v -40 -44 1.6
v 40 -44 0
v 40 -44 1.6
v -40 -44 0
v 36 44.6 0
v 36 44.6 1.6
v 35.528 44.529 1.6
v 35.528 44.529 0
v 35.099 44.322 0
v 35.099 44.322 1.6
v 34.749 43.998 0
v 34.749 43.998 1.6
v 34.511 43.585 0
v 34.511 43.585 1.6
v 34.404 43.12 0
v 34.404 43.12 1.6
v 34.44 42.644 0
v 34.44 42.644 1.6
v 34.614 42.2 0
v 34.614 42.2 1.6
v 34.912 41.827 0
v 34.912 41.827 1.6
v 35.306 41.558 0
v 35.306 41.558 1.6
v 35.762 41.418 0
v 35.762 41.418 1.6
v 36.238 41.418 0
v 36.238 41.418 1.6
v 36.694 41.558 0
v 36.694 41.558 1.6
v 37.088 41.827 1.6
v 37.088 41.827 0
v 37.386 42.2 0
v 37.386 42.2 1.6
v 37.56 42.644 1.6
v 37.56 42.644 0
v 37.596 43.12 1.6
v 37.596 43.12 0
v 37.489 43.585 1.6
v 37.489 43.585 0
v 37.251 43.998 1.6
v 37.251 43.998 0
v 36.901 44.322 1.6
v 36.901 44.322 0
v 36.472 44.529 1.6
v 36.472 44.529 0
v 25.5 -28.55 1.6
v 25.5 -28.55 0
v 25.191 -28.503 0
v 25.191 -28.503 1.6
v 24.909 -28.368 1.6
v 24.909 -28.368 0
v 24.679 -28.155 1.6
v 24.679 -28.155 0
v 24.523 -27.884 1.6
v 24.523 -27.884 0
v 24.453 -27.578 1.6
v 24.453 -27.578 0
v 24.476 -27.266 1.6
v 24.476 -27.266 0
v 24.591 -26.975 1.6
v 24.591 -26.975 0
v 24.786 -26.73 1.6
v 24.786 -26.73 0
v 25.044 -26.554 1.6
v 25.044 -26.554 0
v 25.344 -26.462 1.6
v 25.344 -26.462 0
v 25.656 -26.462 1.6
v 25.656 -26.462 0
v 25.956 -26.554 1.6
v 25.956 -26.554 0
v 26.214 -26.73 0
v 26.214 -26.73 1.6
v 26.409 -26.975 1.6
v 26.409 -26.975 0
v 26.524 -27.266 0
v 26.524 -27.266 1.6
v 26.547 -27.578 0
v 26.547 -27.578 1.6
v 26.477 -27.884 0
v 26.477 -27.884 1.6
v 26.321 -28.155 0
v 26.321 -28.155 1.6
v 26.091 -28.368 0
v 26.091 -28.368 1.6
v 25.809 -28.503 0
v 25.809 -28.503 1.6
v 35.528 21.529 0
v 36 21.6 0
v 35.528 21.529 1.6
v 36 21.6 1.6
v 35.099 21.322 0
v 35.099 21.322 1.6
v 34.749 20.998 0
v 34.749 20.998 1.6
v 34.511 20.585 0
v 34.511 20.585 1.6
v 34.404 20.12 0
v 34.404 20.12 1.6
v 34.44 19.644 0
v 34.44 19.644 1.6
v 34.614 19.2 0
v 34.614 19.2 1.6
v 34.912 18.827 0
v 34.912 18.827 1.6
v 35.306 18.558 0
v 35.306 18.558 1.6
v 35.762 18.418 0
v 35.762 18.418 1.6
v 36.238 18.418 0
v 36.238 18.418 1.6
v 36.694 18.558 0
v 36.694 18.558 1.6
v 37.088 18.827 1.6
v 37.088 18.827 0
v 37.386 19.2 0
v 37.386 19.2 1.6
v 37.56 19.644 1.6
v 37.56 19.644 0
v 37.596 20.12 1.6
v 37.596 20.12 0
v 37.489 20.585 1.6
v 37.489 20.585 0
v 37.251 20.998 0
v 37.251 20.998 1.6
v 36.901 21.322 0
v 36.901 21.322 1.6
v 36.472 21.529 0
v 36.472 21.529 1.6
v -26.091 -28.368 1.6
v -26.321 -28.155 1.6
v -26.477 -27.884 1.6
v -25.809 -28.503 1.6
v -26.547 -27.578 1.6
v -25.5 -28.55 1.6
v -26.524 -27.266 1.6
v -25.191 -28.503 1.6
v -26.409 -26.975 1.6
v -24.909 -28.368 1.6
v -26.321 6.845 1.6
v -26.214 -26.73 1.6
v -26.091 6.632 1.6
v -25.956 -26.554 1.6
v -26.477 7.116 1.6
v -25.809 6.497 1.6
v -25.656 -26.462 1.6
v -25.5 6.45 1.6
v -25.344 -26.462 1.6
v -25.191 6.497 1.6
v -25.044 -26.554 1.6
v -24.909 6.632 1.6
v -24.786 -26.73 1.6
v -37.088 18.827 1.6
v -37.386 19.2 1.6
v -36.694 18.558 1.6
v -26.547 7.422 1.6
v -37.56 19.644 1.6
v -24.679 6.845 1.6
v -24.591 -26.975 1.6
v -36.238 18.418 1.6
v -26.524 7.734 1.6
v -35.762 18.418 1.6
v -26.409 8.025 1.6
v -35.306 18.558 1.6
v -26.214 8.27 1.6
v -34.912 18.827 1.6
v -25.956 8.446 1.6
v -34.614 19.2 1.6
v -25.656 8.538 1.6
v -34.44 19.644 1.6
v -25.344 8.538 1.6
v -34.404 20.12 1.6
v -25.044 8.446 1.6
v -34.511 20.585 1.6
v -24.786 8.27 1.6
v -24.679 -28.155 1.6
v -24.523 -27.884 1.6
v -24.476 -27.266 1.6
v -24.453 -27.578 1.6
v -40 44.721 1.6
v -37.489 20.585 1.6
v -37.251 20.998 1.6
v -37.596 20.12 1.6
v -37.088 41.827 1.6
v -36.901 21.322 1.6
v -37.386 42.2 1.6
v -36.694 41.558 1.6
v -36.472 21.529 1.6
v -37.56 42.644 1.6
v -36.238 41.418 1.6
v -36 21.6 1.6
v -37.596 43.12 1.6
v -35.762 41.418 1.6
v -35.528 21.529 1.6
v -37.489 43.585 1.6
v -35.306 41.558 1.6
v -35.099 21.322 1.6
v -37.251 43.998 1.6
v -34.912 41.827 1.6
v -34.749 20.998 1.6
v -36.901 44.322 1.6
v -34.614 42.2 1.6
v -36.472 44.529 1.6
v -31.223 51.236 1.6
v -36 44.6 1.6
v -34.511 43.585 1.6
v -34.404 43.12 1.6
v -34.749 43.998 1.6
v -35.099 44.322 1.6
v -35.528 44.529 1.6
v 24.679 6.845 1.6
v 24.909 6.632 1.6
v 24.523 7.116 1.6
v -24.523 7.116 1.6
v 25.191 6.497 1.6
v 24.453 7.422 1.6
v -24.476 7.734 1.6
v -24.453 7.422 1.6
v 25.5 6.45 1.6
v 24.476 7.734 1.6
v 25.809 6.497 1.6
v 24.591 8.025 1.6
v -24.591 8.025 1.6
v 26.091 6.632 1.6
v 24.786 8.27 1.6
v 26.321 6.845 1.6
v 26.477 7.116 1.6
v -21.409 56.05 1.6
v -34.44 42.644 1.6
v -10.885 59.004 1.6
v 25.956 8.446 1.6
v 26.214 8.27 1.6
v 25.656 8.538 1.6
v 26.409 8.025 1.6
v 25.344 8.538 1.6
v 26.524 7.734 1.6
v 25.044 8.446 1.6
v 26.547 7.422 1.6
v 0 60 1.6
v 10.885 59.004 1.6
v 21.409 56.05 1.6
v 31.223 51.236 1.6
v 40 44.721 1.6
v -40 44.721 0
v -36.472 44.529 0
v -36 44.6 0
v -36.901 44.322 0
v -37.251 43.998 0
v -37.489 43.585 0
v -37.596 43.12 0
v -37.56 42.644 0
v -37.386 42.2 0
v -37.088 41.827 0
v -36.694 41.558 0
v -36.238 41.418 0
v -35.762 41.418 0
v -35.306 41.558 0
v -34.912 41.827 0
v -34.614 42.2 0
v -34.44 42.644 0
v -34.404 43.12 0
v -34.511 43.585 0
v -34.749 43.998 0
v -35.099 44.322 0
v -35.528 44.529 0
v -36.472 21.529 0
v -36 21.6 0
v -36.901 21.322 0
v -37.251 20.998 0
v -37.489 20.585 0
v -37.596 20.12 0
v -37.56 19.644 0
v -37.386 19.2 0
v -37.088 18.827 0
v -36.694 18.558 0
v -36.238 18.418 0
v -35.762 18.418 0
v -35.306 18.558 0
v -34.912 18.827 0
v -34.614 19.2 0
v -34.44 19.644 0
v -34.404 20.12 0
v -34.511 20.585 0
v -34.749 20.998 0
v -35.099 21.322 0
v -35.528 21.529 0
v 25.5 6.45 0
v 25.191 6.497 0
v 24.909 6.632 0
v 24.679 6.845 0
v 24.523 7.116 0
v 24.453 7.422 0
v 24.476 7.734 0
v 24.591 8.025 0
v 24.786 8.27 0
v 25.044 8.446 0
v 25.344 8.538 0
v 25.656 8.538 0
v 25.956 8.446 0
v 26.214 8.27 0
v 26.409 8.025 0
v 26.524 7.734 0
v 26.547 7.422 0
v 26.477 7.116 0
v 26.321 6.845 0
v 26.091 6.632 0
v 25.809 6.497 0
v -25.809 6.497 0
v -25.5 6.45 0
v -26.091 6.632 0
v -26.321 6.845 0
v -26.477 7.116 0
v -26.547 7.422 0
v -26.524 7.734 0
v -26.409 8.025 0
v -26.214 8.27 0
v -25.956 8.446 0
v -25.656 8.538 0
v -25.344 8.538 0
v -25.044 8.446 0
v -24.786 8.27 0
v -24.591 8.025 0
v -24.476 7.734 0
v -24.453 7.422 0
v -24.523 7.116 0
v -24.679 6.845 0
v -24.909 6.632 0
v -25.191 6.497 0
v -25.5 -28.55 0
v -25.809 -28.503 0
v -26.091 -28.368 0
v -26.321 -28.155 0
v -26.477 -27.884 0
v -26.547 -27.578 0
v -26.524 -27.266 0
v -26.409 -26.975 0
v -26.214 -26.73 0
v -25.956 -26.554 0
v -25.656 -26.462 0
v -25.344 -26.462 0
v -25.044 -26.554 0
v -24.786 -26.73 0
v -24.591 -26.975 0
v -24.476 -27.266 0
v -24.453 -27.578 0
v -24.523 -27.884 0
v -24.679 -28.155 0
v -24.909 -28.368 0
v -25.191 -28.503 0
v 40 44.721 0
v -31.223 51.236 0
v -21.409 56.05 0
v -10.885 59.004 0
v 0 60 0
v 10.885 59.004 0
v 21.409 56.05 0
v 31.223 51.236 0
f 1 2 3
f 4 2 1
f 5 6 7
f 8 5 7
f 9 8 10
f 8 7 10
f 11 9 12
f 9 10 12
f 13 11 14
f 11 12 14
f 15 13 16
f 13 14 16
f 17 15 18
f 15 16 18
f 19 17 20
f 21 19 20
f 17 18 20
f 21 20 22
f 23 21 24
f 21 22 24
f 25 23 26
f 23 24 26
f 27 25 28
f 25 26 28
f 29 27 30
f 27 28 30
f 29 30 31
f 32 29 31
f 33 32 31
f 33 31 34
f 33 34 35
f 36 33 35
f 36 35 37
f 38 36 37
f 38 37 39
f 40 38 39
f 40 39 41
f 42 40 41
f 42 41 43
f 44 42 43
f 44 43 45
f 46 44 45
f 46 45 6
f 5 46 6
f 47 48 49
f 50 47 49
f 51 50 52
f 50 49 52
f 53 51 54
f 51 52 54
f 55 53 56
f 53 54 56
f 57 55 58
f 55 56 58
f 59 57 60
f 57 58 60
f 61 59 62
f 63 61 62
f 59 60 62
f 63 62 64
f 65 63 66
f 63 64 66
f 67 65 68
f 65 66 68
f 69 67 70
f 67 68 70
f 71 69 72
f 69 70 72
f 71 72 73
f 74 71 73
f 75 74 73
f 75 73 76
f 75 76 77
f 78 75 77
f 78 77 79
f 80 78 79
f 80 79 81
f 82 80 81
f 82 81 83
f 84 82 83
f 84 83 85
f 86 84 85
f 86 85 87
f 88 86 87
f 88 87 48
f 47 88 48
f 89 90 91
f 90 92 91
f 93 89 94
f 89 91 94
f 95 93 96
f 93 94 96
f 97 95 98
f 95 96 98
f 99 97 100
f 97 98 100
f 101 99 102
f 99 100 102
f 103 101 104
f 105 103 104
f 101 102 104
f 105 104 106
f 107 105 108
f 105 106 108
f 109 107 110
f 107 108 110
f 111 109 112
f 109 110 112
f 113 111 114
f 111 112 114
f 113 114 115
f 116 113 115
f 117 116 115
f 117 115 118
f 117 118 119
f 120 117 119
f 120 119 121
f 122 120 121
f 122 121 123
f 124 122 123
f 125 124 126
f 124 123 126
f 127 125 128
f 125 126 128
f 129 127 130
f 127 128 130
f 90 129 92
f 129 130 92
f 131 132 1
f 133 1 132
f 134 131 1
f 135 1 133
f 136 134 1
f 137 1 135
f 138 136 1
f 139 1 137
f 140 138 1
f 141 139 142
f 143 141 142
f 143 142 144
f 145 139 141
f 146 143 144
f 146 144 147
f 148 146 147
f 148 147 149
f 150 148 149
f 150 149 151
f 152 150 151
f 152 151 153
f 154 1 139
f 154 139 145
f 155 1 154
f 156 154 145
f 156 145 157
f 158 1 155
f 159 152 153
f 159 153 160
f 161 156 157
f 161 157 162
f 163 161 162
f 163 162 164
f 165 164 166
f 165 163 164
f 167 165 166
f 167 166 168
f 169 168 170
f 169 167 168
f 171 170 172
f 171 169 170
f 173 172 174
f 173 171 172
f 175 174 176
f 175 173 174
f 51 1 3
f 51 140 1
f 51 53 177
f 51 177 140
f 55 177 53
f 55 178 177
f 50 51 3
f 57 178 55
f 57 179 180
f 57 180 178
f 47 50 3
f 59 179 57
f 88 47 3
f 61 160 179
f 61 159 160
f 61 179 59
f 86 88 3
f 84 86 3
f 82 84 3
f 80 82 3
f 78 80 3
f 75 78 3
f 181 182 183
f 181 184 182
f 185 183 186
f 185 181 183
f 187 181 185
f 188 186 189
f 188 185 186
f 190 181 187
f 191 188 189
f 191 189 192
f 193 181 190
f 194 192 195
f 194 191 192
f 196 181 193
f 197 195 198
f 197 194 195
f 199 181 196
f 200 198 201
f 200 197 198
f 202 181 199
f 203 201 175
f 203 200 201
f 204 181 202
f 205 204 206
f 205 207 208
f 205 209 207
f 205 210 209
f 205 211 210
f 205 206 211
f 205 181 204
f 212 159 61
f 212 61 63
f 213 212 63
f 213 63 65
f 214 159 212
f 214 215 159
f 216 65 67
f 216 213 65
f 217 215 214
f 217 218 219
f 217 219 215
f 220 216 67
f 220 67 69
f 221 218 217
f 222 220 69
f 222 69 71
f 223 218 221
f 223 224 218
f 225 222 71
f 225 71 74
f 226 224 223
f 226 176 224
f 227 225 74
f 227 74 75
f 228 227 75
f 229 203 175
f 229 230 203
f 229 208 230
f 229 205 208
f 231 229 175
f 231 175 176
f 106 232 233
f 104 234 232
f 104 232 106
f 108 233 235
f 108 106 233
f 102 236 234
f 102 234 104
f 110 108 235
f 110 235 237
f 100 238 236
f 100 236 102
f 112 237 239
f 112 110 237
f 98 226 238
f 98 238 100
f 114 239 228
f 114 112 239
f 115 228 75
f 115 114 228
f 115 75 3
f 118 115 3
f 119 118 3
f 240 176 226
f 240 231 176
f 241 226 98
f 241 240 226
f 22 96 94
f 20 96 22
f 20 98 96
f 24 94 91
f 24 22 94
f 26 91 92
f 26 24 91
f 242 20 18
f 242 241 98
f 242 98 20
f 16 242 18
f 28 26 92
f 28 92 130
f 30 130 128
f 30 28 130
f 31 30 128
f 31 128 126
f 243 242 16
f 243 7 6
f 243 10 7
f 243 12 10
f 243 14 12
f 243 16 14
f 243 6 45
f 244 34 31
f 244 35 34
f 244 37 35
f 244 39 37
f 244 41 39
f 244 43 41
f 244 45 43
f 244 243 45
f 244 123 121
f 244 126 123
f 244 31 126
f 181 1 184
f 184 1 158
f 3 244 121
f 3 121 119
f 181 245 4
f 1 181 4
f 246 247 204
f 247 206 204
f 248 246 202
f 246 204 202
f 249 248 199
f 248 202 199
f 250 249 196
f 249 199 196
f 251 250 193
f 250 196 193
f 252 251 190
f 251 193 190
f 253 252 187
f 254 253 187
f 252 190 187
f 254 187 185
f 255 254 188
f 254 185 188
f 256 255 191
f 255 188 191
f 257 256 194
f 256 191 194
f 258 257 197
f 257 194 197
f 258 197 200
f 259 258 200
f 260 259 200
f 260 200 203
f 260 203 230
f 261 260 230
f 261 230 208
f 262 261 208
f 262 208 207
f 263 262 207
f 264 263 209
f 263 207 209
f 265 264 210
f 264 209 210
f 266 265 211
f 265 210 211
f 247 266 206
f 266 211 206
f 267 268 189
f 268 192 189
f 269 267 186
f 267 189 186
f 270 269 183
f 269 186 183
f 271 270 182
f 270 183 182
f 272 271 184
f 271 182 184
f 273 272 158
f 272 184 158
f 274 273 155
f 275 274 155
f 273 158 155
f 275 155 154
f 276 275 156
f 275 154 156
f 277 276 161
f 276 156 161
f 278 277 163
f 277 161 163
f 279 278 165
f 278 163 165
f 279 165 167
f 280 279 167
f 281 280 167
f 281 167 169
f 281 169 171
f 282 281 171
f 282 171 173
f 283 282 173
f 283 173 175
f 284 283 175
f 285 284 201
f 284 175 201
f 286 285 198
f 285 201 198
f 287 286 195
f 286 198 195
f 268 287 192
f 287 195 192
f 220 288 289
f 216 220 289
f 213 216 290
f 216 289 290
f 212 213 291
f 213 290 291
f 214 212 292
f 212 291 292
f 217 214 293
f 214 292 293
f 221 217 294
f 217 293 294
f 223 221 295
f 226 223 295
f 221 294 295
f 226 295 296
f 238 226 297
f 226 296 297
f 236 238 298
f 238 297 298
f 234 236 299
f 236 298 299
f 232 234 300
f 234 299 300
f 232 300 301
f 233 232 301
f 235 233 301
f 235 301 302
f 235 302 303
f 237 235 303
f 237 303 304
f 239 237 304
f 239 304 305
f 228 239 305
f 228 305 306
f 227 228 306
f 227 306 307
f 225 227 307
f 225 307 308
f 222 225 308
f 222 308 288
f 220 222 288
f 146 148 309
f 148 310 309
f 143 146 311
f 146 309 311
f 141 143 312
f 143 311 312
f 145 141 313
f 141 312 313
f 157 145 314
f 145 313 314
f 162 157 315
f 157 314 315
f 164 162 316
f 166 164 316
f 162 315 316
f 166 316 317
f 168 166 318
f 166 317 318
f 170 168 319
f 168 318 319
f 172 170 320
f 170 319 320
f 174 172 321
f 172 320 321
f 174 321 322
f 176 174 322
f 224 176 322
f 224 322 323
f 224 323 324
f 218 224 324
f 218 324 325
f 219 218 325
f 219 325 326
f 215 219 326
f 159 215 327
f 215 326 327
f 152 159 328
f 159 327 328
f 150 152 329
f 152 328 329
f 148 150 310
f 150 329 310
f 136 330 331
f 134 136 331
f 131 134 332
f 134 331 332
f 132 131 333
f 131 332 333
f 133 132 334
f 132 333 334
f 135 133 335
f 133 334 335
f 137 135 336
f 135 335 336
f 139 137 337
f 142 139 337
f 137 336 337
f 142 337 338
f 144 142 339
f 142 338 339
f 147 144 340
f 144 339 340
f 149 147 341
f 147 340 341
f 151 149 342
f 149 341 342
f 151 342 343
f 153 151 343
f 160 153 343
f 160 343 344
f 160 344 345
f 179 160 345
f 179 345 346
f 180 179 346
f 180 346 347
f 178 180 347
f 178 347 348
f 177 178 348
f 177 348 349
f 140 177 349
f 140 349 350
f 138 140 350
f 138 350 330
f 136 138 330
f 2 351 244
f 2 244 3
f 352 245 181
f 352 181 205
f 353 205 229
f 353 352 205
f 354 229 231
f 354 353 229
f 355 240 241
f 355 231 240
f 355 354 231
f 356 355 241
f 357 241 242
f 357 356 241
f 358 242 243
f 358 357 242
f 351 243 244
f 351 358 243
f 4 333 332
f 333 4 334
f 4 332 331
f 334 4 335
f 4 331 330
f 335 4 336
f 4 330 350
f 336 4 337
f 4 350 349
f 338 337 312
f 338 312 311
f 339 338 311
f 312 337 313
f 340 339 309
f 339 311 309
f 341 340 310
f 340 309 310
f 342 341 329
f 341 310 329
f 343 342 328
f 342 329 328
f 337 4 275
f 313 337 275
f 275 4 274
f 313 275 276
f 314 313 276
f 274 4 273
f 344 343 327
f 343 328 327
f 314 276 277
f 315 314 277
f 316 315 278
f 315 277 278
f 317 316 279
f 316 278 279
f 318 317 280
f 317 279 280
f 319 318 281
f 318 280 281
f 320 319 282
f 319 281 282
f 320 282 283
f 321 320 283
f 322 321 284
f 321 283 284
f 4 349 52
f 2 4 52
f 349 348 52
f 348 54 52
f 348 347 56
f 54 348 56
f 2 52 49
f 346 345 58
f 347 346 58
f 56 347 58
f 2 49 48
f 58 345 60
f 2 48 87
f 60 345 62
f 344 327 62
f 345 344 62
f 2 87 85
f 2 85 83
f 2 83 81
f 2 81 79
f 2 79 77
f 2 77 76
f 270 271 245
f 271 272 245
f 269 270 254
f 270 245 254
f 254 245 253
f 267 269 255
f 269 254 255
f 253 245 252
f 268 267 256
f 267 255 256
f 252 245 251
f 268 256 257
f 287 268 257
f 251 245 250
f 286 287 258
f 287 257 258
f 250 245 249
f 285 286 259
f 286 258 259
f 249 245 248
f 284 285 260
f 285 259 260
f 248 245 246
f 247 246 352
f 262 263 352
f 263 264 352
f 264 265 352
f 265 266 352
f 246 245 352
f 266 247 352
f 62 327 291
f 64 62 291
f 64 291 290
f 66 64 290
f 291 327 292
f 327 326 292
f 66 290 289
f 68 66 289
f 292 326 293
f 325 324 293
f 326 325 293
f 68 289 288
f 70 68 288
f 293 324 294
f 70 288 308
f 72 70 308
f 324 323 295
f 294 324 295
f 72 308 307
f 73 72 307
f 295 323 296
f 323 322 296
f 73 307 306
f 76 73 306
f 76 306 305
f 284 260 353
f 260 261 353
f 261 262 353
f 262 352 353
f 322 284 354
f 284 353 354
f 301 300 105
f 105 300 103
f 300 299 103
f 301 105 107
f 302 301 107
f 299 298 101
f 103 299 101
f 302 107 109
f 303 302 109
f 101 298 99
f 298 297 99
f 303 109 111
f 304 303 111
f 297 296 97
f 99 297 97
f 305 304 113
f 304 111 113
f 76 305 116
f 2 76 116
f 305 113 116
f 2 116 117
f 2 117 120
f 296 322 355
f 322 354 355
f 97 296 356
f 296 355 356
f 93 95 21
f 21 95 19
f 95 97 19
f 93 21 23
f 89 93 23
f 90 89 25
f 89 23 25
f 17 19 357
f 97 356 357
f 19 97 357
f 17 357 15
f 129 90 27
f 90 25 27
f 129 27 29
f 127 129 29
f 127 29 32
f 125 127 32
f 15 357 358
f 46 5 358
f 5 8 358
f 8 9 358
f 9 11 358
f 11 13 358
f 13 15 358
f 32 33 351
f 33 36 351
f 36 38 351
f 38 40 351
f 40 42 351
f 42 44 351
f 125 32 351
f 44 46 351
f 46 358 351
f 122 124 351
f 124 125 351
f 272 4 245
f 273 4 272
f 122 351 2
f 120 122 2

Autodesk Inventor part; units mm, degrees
ref_plane "YZ Plane" through (0, 0, 0) normal (1, 0, 0) x (0, 1, 0)
ref_plane "XZ Plane" through (0, 0, 0) normal (0, 1, 0) x (-1, 0, 0)
ref_plane "XY Plane" through (0, 0, 0) normal (0, 0, 1) x (1, 0, 0)
sketch "スケッチ1" plane through (0, 0, 0) normal (0, 0, 1) x (1, 0, 0)
  circle A0 centre (0, 0) radius 60 construction
  line L0 (-40, 60) -> (40, 60) construction
  line L1 (40, 60) -> (40, -60) construction
  line L2 (40, -60) -> (-40, -60) construction
  line L3 (-40, -60) -> (-40, 60) construction
  arc A1 (40, 44.7214) -> (-40, 44.7214) centre (0, 0) ccw
  line L4 (-40, 44.7214) -> (-40, -44.7214)
  line L5 (40, 44.7214) -> (40, -44.7214)
  arc A2 (-40, -44.7214) -> (40, -44.7214) centre (0, 0) ccw
  line L6 (40, -44) -> (-40, -44)
  point P0 (0, 60)
  dimension "d0" = 120
  dimension "d1" = 80
  dimension "d41" = 44
extrude "基板" add sketch "スケッチ1" along normal blind 1.6 contours L5 L6 L4 A1
sketch "スケッチ2" plane through (0, 0, 1.6) normal (0, 0, 1) x (1, 0, 0)
  line L0 (0, 110.7931) -> (0, -110.7931) construction
  line L1 (-40, 44.7214) -> (-40, -44) construction
  line L2 (-63.4163, -10) -> (63.4163, -10) construction
  point P0 (0, 0)
  point P1 (0, 0)
  point P2 (0, 0)
  point P3 (-42.5, -49.1808)
  point P4 (-25.5, -27.5)
  point P5 (-25.5, 7.5)
  point P6 (25.5, -27.5)
  point P7 (25.5, 7.5)
  point P8 (0, -10)
  point P9 (-40, -44)
  dimension "BLACKET_SPAN" = 35
  dimension "d40" = 10
  dimension "BLACKET_W" = 51
hole "モータ取付穴" at (-25.5, -27.5, 1.6) at (-25.5, 7.5, 1.6) at (25.5, -27.5, 1.6) at (25.5, 7.5, 1.6) direction (0, 0, -1) diameter 2.1 end through all
sketch "スケッチ6" plane through (0, 0, 0) normal (0, 0, -1) x (-1, 0, 0)
  line L0 (0, 0) -> (0, 96.2051) construction
  point P0 (36, 43)
  point P1 (-36, 43)
  point P2 (-36, 20)
  point P3 (36, 20)
  dimension "CONN_W" = 72
  dimension "CONN_SPAN" = 23
  dimension "CONN_L1" = 43
hole "連結穴" at (-36, 43, 0) at (36, 43, 0) at (36, 20, 0) at (-36, 20, 0) direction (0, 0, 1) diameter 3.2 end through all
properties part number "BaseBoard-SPG27"
